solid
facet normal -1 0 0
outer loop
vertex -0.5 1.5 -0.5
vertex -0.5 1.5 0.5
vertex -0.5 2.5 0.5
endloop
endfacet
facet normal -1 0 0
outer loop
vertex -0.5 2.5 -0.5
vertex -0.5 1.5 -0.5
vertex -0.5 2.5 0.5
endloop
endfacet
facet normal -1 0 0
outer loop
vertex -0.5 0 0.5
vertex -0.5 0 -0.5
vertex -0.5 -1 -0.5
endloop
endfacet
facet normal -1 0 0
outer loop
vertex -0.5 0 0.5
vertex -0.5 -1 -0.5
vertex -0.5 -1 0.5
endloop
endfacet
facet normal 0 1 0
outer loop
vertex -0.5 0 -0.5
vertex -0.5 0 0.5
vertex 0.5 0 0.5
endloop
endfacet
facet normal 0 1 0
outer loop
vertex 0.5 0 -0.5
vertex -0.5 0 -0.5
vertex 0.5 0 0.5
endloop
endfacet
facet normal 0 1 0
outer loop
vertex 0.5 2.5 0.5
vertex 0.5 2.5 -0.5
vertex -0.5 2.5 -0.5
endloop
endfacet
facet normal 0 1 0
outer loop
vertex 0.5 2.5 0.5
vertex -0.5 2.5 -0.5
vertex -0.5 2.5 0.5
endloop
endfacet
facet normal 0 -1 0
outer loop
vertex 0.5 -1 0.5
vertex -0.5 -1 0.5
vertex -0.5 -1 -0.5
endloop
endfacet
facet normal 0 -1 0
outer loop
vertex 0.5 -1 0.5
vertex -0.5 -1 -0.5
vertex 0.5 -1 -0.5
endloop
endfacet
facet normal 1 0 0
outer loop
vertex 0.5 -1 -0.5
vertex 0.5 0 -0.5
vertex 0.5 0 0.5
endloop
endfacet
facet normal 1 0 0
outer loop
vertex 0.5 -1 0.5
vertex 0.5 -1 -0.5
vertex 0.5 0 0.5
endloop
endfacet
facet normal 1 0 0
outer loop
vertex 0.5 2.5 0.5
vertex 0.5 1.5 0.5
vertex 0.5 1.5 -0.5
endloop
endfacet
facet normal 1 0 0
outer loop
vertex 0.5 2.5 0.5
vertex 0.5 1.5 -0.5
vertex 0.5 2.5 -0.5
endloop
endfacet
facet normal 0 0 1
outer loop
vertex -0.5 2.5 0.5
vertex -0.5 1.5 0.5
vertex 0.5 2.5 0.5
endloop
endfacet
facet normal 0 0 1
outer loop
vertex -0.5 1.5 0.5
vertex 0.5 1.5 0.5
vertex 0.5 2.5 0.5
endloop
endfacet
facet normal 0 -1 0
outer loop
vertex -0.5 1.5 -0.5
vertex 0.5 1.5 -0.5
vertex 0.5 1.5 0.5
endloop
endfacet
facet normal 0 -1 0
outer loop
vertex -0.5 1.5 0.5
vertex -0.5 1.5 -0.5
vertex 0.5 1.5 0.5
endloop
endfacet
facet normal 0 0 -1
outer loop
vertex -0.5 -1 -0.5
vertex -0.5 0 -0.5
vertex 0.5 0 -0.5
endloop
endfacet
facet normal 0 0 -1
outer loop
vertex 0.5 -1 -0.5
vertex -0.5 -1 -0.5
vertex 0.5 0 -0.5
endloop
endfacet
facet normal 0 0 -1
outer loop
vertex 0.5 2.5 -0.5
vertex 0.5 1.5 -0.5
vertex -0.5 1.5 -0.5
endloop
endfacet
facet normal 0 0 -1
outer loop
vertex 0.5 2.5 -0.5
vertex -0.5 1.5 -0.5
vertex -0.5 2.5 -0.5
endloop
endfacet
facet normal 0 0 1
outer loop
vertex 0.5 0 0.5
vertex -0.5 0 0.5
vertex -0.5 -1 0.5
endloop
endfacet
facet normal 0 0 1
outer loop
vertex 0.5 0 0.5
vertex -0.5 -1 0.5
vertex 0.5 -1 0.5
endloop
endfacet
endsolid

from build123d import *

# Parameters (mm, degrees)
F0_W          = 1
F0_H          = 1
F1_DEPTH      = 1
F2_W          = 1
F2_H          = 1
F3_DEPTH      = 0.5
F3_DEPTH_BACK = 0.5


with BuildPart() as f1:
    # F0 (on Front) → F1 (new body)
    with BuildSketch(Plane.XZ):
        Rectangle(F0_W, F0_H)
    extrude(amount=F1_DEPTH)


with BuildPart() as f3:
    # F2 (on Right) → F3 (new body, two sides)
    with BuildSketch(Plane.YZ) as f3_sk:
        with Locations((2, 0)):
            Rectangle(F2_W, F2_H)
    extrude(amount=F3_DEPTH)
    extrude(f3_sk.sketch, amount=-F3_DEPTH_BACK)


solid = Compound([f1.part, f3.part])
